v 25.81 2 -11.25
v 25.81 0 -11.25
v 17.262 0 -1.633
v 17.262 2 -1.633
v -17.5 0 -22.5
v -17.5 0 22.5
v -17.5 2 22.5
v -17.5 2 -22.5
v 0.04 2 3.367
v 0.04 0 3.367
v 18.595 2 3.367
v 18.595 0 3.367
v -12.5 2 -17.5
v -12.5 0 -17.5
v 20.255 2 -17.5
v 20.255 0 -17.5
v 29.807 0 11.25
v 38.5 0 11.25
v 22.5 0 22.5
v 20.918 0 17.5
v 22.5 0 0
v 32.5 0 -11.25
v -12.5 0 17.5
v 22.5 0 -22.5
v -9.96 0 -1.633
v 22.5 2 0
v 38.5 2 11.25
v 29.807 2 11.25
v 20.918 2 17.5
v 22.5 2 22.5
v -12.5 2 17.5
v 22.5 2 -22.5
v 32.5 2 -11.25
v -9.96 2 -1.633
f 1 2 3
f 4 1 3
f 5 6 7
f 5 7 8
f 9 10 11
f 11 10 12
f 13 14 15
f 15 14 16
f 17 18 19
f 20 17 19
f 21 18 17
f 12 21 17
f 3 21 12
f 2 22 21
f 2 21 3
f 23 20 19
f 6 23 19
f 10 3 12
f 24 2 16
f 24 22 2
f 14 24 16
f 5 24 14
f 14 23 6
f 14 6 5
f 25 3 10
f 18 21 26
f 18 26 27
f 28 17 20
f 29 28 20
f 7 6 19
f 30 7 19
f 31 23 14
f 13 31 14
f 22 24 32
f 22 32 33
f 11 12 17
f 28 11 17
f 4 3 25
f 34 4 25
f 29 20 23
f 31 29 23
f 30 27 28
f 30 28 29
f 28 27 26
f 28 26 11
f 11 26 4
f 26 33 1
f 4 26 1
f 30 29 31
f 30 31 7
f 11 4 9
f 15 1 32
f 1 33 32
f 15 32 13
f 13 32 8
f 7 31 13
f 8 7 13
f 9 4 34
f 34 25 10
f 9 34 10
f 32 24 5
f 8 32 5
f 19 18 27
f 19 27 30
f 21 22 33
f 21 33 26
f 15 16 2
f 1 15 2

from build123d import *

# Parameters (mm, degrees)
BOSS_EXTRUDE1_DEPTH = 2


with BuildPart() as part:
    # Sketch2 → Boss-Extrude1 (new body)
    with BuildSketch(Plane(origin=(0, 0, 0), x_dir=(1, 0, 0), z_dir=(0, 1, 0))):
        Polygon((17.5, 22.5), (22.5, 22.5), (32.5, 11.25), (22.5, 0), (38.5, -11.25), (22.5, -22.5), (17.5, -22.5), (-17.5, -22.5), (-17.5, 22.5), align=None)
        Polygon((17.5, 17.5), (20.254669678, 17.5), (25.810225234, 11.25), (17.261983906, 1.633228506), (15.039761683, 1.633228506), (-9.960238317, 1.633228506), (0.039761683, -3.366771494), (15.039761683, -3.366771494), (18.595317239, -3.366771494), (29.807020003, -11.25), (20.918131114, -17.5), (17.5, -17.5), (-12.5, -17.5), (-12.5, 17.5), align=None, mode=Mode.SUBTRACT)
    extrude(amount=BOSS_EXTRUDE1_DEPTH)


solid = part.part
